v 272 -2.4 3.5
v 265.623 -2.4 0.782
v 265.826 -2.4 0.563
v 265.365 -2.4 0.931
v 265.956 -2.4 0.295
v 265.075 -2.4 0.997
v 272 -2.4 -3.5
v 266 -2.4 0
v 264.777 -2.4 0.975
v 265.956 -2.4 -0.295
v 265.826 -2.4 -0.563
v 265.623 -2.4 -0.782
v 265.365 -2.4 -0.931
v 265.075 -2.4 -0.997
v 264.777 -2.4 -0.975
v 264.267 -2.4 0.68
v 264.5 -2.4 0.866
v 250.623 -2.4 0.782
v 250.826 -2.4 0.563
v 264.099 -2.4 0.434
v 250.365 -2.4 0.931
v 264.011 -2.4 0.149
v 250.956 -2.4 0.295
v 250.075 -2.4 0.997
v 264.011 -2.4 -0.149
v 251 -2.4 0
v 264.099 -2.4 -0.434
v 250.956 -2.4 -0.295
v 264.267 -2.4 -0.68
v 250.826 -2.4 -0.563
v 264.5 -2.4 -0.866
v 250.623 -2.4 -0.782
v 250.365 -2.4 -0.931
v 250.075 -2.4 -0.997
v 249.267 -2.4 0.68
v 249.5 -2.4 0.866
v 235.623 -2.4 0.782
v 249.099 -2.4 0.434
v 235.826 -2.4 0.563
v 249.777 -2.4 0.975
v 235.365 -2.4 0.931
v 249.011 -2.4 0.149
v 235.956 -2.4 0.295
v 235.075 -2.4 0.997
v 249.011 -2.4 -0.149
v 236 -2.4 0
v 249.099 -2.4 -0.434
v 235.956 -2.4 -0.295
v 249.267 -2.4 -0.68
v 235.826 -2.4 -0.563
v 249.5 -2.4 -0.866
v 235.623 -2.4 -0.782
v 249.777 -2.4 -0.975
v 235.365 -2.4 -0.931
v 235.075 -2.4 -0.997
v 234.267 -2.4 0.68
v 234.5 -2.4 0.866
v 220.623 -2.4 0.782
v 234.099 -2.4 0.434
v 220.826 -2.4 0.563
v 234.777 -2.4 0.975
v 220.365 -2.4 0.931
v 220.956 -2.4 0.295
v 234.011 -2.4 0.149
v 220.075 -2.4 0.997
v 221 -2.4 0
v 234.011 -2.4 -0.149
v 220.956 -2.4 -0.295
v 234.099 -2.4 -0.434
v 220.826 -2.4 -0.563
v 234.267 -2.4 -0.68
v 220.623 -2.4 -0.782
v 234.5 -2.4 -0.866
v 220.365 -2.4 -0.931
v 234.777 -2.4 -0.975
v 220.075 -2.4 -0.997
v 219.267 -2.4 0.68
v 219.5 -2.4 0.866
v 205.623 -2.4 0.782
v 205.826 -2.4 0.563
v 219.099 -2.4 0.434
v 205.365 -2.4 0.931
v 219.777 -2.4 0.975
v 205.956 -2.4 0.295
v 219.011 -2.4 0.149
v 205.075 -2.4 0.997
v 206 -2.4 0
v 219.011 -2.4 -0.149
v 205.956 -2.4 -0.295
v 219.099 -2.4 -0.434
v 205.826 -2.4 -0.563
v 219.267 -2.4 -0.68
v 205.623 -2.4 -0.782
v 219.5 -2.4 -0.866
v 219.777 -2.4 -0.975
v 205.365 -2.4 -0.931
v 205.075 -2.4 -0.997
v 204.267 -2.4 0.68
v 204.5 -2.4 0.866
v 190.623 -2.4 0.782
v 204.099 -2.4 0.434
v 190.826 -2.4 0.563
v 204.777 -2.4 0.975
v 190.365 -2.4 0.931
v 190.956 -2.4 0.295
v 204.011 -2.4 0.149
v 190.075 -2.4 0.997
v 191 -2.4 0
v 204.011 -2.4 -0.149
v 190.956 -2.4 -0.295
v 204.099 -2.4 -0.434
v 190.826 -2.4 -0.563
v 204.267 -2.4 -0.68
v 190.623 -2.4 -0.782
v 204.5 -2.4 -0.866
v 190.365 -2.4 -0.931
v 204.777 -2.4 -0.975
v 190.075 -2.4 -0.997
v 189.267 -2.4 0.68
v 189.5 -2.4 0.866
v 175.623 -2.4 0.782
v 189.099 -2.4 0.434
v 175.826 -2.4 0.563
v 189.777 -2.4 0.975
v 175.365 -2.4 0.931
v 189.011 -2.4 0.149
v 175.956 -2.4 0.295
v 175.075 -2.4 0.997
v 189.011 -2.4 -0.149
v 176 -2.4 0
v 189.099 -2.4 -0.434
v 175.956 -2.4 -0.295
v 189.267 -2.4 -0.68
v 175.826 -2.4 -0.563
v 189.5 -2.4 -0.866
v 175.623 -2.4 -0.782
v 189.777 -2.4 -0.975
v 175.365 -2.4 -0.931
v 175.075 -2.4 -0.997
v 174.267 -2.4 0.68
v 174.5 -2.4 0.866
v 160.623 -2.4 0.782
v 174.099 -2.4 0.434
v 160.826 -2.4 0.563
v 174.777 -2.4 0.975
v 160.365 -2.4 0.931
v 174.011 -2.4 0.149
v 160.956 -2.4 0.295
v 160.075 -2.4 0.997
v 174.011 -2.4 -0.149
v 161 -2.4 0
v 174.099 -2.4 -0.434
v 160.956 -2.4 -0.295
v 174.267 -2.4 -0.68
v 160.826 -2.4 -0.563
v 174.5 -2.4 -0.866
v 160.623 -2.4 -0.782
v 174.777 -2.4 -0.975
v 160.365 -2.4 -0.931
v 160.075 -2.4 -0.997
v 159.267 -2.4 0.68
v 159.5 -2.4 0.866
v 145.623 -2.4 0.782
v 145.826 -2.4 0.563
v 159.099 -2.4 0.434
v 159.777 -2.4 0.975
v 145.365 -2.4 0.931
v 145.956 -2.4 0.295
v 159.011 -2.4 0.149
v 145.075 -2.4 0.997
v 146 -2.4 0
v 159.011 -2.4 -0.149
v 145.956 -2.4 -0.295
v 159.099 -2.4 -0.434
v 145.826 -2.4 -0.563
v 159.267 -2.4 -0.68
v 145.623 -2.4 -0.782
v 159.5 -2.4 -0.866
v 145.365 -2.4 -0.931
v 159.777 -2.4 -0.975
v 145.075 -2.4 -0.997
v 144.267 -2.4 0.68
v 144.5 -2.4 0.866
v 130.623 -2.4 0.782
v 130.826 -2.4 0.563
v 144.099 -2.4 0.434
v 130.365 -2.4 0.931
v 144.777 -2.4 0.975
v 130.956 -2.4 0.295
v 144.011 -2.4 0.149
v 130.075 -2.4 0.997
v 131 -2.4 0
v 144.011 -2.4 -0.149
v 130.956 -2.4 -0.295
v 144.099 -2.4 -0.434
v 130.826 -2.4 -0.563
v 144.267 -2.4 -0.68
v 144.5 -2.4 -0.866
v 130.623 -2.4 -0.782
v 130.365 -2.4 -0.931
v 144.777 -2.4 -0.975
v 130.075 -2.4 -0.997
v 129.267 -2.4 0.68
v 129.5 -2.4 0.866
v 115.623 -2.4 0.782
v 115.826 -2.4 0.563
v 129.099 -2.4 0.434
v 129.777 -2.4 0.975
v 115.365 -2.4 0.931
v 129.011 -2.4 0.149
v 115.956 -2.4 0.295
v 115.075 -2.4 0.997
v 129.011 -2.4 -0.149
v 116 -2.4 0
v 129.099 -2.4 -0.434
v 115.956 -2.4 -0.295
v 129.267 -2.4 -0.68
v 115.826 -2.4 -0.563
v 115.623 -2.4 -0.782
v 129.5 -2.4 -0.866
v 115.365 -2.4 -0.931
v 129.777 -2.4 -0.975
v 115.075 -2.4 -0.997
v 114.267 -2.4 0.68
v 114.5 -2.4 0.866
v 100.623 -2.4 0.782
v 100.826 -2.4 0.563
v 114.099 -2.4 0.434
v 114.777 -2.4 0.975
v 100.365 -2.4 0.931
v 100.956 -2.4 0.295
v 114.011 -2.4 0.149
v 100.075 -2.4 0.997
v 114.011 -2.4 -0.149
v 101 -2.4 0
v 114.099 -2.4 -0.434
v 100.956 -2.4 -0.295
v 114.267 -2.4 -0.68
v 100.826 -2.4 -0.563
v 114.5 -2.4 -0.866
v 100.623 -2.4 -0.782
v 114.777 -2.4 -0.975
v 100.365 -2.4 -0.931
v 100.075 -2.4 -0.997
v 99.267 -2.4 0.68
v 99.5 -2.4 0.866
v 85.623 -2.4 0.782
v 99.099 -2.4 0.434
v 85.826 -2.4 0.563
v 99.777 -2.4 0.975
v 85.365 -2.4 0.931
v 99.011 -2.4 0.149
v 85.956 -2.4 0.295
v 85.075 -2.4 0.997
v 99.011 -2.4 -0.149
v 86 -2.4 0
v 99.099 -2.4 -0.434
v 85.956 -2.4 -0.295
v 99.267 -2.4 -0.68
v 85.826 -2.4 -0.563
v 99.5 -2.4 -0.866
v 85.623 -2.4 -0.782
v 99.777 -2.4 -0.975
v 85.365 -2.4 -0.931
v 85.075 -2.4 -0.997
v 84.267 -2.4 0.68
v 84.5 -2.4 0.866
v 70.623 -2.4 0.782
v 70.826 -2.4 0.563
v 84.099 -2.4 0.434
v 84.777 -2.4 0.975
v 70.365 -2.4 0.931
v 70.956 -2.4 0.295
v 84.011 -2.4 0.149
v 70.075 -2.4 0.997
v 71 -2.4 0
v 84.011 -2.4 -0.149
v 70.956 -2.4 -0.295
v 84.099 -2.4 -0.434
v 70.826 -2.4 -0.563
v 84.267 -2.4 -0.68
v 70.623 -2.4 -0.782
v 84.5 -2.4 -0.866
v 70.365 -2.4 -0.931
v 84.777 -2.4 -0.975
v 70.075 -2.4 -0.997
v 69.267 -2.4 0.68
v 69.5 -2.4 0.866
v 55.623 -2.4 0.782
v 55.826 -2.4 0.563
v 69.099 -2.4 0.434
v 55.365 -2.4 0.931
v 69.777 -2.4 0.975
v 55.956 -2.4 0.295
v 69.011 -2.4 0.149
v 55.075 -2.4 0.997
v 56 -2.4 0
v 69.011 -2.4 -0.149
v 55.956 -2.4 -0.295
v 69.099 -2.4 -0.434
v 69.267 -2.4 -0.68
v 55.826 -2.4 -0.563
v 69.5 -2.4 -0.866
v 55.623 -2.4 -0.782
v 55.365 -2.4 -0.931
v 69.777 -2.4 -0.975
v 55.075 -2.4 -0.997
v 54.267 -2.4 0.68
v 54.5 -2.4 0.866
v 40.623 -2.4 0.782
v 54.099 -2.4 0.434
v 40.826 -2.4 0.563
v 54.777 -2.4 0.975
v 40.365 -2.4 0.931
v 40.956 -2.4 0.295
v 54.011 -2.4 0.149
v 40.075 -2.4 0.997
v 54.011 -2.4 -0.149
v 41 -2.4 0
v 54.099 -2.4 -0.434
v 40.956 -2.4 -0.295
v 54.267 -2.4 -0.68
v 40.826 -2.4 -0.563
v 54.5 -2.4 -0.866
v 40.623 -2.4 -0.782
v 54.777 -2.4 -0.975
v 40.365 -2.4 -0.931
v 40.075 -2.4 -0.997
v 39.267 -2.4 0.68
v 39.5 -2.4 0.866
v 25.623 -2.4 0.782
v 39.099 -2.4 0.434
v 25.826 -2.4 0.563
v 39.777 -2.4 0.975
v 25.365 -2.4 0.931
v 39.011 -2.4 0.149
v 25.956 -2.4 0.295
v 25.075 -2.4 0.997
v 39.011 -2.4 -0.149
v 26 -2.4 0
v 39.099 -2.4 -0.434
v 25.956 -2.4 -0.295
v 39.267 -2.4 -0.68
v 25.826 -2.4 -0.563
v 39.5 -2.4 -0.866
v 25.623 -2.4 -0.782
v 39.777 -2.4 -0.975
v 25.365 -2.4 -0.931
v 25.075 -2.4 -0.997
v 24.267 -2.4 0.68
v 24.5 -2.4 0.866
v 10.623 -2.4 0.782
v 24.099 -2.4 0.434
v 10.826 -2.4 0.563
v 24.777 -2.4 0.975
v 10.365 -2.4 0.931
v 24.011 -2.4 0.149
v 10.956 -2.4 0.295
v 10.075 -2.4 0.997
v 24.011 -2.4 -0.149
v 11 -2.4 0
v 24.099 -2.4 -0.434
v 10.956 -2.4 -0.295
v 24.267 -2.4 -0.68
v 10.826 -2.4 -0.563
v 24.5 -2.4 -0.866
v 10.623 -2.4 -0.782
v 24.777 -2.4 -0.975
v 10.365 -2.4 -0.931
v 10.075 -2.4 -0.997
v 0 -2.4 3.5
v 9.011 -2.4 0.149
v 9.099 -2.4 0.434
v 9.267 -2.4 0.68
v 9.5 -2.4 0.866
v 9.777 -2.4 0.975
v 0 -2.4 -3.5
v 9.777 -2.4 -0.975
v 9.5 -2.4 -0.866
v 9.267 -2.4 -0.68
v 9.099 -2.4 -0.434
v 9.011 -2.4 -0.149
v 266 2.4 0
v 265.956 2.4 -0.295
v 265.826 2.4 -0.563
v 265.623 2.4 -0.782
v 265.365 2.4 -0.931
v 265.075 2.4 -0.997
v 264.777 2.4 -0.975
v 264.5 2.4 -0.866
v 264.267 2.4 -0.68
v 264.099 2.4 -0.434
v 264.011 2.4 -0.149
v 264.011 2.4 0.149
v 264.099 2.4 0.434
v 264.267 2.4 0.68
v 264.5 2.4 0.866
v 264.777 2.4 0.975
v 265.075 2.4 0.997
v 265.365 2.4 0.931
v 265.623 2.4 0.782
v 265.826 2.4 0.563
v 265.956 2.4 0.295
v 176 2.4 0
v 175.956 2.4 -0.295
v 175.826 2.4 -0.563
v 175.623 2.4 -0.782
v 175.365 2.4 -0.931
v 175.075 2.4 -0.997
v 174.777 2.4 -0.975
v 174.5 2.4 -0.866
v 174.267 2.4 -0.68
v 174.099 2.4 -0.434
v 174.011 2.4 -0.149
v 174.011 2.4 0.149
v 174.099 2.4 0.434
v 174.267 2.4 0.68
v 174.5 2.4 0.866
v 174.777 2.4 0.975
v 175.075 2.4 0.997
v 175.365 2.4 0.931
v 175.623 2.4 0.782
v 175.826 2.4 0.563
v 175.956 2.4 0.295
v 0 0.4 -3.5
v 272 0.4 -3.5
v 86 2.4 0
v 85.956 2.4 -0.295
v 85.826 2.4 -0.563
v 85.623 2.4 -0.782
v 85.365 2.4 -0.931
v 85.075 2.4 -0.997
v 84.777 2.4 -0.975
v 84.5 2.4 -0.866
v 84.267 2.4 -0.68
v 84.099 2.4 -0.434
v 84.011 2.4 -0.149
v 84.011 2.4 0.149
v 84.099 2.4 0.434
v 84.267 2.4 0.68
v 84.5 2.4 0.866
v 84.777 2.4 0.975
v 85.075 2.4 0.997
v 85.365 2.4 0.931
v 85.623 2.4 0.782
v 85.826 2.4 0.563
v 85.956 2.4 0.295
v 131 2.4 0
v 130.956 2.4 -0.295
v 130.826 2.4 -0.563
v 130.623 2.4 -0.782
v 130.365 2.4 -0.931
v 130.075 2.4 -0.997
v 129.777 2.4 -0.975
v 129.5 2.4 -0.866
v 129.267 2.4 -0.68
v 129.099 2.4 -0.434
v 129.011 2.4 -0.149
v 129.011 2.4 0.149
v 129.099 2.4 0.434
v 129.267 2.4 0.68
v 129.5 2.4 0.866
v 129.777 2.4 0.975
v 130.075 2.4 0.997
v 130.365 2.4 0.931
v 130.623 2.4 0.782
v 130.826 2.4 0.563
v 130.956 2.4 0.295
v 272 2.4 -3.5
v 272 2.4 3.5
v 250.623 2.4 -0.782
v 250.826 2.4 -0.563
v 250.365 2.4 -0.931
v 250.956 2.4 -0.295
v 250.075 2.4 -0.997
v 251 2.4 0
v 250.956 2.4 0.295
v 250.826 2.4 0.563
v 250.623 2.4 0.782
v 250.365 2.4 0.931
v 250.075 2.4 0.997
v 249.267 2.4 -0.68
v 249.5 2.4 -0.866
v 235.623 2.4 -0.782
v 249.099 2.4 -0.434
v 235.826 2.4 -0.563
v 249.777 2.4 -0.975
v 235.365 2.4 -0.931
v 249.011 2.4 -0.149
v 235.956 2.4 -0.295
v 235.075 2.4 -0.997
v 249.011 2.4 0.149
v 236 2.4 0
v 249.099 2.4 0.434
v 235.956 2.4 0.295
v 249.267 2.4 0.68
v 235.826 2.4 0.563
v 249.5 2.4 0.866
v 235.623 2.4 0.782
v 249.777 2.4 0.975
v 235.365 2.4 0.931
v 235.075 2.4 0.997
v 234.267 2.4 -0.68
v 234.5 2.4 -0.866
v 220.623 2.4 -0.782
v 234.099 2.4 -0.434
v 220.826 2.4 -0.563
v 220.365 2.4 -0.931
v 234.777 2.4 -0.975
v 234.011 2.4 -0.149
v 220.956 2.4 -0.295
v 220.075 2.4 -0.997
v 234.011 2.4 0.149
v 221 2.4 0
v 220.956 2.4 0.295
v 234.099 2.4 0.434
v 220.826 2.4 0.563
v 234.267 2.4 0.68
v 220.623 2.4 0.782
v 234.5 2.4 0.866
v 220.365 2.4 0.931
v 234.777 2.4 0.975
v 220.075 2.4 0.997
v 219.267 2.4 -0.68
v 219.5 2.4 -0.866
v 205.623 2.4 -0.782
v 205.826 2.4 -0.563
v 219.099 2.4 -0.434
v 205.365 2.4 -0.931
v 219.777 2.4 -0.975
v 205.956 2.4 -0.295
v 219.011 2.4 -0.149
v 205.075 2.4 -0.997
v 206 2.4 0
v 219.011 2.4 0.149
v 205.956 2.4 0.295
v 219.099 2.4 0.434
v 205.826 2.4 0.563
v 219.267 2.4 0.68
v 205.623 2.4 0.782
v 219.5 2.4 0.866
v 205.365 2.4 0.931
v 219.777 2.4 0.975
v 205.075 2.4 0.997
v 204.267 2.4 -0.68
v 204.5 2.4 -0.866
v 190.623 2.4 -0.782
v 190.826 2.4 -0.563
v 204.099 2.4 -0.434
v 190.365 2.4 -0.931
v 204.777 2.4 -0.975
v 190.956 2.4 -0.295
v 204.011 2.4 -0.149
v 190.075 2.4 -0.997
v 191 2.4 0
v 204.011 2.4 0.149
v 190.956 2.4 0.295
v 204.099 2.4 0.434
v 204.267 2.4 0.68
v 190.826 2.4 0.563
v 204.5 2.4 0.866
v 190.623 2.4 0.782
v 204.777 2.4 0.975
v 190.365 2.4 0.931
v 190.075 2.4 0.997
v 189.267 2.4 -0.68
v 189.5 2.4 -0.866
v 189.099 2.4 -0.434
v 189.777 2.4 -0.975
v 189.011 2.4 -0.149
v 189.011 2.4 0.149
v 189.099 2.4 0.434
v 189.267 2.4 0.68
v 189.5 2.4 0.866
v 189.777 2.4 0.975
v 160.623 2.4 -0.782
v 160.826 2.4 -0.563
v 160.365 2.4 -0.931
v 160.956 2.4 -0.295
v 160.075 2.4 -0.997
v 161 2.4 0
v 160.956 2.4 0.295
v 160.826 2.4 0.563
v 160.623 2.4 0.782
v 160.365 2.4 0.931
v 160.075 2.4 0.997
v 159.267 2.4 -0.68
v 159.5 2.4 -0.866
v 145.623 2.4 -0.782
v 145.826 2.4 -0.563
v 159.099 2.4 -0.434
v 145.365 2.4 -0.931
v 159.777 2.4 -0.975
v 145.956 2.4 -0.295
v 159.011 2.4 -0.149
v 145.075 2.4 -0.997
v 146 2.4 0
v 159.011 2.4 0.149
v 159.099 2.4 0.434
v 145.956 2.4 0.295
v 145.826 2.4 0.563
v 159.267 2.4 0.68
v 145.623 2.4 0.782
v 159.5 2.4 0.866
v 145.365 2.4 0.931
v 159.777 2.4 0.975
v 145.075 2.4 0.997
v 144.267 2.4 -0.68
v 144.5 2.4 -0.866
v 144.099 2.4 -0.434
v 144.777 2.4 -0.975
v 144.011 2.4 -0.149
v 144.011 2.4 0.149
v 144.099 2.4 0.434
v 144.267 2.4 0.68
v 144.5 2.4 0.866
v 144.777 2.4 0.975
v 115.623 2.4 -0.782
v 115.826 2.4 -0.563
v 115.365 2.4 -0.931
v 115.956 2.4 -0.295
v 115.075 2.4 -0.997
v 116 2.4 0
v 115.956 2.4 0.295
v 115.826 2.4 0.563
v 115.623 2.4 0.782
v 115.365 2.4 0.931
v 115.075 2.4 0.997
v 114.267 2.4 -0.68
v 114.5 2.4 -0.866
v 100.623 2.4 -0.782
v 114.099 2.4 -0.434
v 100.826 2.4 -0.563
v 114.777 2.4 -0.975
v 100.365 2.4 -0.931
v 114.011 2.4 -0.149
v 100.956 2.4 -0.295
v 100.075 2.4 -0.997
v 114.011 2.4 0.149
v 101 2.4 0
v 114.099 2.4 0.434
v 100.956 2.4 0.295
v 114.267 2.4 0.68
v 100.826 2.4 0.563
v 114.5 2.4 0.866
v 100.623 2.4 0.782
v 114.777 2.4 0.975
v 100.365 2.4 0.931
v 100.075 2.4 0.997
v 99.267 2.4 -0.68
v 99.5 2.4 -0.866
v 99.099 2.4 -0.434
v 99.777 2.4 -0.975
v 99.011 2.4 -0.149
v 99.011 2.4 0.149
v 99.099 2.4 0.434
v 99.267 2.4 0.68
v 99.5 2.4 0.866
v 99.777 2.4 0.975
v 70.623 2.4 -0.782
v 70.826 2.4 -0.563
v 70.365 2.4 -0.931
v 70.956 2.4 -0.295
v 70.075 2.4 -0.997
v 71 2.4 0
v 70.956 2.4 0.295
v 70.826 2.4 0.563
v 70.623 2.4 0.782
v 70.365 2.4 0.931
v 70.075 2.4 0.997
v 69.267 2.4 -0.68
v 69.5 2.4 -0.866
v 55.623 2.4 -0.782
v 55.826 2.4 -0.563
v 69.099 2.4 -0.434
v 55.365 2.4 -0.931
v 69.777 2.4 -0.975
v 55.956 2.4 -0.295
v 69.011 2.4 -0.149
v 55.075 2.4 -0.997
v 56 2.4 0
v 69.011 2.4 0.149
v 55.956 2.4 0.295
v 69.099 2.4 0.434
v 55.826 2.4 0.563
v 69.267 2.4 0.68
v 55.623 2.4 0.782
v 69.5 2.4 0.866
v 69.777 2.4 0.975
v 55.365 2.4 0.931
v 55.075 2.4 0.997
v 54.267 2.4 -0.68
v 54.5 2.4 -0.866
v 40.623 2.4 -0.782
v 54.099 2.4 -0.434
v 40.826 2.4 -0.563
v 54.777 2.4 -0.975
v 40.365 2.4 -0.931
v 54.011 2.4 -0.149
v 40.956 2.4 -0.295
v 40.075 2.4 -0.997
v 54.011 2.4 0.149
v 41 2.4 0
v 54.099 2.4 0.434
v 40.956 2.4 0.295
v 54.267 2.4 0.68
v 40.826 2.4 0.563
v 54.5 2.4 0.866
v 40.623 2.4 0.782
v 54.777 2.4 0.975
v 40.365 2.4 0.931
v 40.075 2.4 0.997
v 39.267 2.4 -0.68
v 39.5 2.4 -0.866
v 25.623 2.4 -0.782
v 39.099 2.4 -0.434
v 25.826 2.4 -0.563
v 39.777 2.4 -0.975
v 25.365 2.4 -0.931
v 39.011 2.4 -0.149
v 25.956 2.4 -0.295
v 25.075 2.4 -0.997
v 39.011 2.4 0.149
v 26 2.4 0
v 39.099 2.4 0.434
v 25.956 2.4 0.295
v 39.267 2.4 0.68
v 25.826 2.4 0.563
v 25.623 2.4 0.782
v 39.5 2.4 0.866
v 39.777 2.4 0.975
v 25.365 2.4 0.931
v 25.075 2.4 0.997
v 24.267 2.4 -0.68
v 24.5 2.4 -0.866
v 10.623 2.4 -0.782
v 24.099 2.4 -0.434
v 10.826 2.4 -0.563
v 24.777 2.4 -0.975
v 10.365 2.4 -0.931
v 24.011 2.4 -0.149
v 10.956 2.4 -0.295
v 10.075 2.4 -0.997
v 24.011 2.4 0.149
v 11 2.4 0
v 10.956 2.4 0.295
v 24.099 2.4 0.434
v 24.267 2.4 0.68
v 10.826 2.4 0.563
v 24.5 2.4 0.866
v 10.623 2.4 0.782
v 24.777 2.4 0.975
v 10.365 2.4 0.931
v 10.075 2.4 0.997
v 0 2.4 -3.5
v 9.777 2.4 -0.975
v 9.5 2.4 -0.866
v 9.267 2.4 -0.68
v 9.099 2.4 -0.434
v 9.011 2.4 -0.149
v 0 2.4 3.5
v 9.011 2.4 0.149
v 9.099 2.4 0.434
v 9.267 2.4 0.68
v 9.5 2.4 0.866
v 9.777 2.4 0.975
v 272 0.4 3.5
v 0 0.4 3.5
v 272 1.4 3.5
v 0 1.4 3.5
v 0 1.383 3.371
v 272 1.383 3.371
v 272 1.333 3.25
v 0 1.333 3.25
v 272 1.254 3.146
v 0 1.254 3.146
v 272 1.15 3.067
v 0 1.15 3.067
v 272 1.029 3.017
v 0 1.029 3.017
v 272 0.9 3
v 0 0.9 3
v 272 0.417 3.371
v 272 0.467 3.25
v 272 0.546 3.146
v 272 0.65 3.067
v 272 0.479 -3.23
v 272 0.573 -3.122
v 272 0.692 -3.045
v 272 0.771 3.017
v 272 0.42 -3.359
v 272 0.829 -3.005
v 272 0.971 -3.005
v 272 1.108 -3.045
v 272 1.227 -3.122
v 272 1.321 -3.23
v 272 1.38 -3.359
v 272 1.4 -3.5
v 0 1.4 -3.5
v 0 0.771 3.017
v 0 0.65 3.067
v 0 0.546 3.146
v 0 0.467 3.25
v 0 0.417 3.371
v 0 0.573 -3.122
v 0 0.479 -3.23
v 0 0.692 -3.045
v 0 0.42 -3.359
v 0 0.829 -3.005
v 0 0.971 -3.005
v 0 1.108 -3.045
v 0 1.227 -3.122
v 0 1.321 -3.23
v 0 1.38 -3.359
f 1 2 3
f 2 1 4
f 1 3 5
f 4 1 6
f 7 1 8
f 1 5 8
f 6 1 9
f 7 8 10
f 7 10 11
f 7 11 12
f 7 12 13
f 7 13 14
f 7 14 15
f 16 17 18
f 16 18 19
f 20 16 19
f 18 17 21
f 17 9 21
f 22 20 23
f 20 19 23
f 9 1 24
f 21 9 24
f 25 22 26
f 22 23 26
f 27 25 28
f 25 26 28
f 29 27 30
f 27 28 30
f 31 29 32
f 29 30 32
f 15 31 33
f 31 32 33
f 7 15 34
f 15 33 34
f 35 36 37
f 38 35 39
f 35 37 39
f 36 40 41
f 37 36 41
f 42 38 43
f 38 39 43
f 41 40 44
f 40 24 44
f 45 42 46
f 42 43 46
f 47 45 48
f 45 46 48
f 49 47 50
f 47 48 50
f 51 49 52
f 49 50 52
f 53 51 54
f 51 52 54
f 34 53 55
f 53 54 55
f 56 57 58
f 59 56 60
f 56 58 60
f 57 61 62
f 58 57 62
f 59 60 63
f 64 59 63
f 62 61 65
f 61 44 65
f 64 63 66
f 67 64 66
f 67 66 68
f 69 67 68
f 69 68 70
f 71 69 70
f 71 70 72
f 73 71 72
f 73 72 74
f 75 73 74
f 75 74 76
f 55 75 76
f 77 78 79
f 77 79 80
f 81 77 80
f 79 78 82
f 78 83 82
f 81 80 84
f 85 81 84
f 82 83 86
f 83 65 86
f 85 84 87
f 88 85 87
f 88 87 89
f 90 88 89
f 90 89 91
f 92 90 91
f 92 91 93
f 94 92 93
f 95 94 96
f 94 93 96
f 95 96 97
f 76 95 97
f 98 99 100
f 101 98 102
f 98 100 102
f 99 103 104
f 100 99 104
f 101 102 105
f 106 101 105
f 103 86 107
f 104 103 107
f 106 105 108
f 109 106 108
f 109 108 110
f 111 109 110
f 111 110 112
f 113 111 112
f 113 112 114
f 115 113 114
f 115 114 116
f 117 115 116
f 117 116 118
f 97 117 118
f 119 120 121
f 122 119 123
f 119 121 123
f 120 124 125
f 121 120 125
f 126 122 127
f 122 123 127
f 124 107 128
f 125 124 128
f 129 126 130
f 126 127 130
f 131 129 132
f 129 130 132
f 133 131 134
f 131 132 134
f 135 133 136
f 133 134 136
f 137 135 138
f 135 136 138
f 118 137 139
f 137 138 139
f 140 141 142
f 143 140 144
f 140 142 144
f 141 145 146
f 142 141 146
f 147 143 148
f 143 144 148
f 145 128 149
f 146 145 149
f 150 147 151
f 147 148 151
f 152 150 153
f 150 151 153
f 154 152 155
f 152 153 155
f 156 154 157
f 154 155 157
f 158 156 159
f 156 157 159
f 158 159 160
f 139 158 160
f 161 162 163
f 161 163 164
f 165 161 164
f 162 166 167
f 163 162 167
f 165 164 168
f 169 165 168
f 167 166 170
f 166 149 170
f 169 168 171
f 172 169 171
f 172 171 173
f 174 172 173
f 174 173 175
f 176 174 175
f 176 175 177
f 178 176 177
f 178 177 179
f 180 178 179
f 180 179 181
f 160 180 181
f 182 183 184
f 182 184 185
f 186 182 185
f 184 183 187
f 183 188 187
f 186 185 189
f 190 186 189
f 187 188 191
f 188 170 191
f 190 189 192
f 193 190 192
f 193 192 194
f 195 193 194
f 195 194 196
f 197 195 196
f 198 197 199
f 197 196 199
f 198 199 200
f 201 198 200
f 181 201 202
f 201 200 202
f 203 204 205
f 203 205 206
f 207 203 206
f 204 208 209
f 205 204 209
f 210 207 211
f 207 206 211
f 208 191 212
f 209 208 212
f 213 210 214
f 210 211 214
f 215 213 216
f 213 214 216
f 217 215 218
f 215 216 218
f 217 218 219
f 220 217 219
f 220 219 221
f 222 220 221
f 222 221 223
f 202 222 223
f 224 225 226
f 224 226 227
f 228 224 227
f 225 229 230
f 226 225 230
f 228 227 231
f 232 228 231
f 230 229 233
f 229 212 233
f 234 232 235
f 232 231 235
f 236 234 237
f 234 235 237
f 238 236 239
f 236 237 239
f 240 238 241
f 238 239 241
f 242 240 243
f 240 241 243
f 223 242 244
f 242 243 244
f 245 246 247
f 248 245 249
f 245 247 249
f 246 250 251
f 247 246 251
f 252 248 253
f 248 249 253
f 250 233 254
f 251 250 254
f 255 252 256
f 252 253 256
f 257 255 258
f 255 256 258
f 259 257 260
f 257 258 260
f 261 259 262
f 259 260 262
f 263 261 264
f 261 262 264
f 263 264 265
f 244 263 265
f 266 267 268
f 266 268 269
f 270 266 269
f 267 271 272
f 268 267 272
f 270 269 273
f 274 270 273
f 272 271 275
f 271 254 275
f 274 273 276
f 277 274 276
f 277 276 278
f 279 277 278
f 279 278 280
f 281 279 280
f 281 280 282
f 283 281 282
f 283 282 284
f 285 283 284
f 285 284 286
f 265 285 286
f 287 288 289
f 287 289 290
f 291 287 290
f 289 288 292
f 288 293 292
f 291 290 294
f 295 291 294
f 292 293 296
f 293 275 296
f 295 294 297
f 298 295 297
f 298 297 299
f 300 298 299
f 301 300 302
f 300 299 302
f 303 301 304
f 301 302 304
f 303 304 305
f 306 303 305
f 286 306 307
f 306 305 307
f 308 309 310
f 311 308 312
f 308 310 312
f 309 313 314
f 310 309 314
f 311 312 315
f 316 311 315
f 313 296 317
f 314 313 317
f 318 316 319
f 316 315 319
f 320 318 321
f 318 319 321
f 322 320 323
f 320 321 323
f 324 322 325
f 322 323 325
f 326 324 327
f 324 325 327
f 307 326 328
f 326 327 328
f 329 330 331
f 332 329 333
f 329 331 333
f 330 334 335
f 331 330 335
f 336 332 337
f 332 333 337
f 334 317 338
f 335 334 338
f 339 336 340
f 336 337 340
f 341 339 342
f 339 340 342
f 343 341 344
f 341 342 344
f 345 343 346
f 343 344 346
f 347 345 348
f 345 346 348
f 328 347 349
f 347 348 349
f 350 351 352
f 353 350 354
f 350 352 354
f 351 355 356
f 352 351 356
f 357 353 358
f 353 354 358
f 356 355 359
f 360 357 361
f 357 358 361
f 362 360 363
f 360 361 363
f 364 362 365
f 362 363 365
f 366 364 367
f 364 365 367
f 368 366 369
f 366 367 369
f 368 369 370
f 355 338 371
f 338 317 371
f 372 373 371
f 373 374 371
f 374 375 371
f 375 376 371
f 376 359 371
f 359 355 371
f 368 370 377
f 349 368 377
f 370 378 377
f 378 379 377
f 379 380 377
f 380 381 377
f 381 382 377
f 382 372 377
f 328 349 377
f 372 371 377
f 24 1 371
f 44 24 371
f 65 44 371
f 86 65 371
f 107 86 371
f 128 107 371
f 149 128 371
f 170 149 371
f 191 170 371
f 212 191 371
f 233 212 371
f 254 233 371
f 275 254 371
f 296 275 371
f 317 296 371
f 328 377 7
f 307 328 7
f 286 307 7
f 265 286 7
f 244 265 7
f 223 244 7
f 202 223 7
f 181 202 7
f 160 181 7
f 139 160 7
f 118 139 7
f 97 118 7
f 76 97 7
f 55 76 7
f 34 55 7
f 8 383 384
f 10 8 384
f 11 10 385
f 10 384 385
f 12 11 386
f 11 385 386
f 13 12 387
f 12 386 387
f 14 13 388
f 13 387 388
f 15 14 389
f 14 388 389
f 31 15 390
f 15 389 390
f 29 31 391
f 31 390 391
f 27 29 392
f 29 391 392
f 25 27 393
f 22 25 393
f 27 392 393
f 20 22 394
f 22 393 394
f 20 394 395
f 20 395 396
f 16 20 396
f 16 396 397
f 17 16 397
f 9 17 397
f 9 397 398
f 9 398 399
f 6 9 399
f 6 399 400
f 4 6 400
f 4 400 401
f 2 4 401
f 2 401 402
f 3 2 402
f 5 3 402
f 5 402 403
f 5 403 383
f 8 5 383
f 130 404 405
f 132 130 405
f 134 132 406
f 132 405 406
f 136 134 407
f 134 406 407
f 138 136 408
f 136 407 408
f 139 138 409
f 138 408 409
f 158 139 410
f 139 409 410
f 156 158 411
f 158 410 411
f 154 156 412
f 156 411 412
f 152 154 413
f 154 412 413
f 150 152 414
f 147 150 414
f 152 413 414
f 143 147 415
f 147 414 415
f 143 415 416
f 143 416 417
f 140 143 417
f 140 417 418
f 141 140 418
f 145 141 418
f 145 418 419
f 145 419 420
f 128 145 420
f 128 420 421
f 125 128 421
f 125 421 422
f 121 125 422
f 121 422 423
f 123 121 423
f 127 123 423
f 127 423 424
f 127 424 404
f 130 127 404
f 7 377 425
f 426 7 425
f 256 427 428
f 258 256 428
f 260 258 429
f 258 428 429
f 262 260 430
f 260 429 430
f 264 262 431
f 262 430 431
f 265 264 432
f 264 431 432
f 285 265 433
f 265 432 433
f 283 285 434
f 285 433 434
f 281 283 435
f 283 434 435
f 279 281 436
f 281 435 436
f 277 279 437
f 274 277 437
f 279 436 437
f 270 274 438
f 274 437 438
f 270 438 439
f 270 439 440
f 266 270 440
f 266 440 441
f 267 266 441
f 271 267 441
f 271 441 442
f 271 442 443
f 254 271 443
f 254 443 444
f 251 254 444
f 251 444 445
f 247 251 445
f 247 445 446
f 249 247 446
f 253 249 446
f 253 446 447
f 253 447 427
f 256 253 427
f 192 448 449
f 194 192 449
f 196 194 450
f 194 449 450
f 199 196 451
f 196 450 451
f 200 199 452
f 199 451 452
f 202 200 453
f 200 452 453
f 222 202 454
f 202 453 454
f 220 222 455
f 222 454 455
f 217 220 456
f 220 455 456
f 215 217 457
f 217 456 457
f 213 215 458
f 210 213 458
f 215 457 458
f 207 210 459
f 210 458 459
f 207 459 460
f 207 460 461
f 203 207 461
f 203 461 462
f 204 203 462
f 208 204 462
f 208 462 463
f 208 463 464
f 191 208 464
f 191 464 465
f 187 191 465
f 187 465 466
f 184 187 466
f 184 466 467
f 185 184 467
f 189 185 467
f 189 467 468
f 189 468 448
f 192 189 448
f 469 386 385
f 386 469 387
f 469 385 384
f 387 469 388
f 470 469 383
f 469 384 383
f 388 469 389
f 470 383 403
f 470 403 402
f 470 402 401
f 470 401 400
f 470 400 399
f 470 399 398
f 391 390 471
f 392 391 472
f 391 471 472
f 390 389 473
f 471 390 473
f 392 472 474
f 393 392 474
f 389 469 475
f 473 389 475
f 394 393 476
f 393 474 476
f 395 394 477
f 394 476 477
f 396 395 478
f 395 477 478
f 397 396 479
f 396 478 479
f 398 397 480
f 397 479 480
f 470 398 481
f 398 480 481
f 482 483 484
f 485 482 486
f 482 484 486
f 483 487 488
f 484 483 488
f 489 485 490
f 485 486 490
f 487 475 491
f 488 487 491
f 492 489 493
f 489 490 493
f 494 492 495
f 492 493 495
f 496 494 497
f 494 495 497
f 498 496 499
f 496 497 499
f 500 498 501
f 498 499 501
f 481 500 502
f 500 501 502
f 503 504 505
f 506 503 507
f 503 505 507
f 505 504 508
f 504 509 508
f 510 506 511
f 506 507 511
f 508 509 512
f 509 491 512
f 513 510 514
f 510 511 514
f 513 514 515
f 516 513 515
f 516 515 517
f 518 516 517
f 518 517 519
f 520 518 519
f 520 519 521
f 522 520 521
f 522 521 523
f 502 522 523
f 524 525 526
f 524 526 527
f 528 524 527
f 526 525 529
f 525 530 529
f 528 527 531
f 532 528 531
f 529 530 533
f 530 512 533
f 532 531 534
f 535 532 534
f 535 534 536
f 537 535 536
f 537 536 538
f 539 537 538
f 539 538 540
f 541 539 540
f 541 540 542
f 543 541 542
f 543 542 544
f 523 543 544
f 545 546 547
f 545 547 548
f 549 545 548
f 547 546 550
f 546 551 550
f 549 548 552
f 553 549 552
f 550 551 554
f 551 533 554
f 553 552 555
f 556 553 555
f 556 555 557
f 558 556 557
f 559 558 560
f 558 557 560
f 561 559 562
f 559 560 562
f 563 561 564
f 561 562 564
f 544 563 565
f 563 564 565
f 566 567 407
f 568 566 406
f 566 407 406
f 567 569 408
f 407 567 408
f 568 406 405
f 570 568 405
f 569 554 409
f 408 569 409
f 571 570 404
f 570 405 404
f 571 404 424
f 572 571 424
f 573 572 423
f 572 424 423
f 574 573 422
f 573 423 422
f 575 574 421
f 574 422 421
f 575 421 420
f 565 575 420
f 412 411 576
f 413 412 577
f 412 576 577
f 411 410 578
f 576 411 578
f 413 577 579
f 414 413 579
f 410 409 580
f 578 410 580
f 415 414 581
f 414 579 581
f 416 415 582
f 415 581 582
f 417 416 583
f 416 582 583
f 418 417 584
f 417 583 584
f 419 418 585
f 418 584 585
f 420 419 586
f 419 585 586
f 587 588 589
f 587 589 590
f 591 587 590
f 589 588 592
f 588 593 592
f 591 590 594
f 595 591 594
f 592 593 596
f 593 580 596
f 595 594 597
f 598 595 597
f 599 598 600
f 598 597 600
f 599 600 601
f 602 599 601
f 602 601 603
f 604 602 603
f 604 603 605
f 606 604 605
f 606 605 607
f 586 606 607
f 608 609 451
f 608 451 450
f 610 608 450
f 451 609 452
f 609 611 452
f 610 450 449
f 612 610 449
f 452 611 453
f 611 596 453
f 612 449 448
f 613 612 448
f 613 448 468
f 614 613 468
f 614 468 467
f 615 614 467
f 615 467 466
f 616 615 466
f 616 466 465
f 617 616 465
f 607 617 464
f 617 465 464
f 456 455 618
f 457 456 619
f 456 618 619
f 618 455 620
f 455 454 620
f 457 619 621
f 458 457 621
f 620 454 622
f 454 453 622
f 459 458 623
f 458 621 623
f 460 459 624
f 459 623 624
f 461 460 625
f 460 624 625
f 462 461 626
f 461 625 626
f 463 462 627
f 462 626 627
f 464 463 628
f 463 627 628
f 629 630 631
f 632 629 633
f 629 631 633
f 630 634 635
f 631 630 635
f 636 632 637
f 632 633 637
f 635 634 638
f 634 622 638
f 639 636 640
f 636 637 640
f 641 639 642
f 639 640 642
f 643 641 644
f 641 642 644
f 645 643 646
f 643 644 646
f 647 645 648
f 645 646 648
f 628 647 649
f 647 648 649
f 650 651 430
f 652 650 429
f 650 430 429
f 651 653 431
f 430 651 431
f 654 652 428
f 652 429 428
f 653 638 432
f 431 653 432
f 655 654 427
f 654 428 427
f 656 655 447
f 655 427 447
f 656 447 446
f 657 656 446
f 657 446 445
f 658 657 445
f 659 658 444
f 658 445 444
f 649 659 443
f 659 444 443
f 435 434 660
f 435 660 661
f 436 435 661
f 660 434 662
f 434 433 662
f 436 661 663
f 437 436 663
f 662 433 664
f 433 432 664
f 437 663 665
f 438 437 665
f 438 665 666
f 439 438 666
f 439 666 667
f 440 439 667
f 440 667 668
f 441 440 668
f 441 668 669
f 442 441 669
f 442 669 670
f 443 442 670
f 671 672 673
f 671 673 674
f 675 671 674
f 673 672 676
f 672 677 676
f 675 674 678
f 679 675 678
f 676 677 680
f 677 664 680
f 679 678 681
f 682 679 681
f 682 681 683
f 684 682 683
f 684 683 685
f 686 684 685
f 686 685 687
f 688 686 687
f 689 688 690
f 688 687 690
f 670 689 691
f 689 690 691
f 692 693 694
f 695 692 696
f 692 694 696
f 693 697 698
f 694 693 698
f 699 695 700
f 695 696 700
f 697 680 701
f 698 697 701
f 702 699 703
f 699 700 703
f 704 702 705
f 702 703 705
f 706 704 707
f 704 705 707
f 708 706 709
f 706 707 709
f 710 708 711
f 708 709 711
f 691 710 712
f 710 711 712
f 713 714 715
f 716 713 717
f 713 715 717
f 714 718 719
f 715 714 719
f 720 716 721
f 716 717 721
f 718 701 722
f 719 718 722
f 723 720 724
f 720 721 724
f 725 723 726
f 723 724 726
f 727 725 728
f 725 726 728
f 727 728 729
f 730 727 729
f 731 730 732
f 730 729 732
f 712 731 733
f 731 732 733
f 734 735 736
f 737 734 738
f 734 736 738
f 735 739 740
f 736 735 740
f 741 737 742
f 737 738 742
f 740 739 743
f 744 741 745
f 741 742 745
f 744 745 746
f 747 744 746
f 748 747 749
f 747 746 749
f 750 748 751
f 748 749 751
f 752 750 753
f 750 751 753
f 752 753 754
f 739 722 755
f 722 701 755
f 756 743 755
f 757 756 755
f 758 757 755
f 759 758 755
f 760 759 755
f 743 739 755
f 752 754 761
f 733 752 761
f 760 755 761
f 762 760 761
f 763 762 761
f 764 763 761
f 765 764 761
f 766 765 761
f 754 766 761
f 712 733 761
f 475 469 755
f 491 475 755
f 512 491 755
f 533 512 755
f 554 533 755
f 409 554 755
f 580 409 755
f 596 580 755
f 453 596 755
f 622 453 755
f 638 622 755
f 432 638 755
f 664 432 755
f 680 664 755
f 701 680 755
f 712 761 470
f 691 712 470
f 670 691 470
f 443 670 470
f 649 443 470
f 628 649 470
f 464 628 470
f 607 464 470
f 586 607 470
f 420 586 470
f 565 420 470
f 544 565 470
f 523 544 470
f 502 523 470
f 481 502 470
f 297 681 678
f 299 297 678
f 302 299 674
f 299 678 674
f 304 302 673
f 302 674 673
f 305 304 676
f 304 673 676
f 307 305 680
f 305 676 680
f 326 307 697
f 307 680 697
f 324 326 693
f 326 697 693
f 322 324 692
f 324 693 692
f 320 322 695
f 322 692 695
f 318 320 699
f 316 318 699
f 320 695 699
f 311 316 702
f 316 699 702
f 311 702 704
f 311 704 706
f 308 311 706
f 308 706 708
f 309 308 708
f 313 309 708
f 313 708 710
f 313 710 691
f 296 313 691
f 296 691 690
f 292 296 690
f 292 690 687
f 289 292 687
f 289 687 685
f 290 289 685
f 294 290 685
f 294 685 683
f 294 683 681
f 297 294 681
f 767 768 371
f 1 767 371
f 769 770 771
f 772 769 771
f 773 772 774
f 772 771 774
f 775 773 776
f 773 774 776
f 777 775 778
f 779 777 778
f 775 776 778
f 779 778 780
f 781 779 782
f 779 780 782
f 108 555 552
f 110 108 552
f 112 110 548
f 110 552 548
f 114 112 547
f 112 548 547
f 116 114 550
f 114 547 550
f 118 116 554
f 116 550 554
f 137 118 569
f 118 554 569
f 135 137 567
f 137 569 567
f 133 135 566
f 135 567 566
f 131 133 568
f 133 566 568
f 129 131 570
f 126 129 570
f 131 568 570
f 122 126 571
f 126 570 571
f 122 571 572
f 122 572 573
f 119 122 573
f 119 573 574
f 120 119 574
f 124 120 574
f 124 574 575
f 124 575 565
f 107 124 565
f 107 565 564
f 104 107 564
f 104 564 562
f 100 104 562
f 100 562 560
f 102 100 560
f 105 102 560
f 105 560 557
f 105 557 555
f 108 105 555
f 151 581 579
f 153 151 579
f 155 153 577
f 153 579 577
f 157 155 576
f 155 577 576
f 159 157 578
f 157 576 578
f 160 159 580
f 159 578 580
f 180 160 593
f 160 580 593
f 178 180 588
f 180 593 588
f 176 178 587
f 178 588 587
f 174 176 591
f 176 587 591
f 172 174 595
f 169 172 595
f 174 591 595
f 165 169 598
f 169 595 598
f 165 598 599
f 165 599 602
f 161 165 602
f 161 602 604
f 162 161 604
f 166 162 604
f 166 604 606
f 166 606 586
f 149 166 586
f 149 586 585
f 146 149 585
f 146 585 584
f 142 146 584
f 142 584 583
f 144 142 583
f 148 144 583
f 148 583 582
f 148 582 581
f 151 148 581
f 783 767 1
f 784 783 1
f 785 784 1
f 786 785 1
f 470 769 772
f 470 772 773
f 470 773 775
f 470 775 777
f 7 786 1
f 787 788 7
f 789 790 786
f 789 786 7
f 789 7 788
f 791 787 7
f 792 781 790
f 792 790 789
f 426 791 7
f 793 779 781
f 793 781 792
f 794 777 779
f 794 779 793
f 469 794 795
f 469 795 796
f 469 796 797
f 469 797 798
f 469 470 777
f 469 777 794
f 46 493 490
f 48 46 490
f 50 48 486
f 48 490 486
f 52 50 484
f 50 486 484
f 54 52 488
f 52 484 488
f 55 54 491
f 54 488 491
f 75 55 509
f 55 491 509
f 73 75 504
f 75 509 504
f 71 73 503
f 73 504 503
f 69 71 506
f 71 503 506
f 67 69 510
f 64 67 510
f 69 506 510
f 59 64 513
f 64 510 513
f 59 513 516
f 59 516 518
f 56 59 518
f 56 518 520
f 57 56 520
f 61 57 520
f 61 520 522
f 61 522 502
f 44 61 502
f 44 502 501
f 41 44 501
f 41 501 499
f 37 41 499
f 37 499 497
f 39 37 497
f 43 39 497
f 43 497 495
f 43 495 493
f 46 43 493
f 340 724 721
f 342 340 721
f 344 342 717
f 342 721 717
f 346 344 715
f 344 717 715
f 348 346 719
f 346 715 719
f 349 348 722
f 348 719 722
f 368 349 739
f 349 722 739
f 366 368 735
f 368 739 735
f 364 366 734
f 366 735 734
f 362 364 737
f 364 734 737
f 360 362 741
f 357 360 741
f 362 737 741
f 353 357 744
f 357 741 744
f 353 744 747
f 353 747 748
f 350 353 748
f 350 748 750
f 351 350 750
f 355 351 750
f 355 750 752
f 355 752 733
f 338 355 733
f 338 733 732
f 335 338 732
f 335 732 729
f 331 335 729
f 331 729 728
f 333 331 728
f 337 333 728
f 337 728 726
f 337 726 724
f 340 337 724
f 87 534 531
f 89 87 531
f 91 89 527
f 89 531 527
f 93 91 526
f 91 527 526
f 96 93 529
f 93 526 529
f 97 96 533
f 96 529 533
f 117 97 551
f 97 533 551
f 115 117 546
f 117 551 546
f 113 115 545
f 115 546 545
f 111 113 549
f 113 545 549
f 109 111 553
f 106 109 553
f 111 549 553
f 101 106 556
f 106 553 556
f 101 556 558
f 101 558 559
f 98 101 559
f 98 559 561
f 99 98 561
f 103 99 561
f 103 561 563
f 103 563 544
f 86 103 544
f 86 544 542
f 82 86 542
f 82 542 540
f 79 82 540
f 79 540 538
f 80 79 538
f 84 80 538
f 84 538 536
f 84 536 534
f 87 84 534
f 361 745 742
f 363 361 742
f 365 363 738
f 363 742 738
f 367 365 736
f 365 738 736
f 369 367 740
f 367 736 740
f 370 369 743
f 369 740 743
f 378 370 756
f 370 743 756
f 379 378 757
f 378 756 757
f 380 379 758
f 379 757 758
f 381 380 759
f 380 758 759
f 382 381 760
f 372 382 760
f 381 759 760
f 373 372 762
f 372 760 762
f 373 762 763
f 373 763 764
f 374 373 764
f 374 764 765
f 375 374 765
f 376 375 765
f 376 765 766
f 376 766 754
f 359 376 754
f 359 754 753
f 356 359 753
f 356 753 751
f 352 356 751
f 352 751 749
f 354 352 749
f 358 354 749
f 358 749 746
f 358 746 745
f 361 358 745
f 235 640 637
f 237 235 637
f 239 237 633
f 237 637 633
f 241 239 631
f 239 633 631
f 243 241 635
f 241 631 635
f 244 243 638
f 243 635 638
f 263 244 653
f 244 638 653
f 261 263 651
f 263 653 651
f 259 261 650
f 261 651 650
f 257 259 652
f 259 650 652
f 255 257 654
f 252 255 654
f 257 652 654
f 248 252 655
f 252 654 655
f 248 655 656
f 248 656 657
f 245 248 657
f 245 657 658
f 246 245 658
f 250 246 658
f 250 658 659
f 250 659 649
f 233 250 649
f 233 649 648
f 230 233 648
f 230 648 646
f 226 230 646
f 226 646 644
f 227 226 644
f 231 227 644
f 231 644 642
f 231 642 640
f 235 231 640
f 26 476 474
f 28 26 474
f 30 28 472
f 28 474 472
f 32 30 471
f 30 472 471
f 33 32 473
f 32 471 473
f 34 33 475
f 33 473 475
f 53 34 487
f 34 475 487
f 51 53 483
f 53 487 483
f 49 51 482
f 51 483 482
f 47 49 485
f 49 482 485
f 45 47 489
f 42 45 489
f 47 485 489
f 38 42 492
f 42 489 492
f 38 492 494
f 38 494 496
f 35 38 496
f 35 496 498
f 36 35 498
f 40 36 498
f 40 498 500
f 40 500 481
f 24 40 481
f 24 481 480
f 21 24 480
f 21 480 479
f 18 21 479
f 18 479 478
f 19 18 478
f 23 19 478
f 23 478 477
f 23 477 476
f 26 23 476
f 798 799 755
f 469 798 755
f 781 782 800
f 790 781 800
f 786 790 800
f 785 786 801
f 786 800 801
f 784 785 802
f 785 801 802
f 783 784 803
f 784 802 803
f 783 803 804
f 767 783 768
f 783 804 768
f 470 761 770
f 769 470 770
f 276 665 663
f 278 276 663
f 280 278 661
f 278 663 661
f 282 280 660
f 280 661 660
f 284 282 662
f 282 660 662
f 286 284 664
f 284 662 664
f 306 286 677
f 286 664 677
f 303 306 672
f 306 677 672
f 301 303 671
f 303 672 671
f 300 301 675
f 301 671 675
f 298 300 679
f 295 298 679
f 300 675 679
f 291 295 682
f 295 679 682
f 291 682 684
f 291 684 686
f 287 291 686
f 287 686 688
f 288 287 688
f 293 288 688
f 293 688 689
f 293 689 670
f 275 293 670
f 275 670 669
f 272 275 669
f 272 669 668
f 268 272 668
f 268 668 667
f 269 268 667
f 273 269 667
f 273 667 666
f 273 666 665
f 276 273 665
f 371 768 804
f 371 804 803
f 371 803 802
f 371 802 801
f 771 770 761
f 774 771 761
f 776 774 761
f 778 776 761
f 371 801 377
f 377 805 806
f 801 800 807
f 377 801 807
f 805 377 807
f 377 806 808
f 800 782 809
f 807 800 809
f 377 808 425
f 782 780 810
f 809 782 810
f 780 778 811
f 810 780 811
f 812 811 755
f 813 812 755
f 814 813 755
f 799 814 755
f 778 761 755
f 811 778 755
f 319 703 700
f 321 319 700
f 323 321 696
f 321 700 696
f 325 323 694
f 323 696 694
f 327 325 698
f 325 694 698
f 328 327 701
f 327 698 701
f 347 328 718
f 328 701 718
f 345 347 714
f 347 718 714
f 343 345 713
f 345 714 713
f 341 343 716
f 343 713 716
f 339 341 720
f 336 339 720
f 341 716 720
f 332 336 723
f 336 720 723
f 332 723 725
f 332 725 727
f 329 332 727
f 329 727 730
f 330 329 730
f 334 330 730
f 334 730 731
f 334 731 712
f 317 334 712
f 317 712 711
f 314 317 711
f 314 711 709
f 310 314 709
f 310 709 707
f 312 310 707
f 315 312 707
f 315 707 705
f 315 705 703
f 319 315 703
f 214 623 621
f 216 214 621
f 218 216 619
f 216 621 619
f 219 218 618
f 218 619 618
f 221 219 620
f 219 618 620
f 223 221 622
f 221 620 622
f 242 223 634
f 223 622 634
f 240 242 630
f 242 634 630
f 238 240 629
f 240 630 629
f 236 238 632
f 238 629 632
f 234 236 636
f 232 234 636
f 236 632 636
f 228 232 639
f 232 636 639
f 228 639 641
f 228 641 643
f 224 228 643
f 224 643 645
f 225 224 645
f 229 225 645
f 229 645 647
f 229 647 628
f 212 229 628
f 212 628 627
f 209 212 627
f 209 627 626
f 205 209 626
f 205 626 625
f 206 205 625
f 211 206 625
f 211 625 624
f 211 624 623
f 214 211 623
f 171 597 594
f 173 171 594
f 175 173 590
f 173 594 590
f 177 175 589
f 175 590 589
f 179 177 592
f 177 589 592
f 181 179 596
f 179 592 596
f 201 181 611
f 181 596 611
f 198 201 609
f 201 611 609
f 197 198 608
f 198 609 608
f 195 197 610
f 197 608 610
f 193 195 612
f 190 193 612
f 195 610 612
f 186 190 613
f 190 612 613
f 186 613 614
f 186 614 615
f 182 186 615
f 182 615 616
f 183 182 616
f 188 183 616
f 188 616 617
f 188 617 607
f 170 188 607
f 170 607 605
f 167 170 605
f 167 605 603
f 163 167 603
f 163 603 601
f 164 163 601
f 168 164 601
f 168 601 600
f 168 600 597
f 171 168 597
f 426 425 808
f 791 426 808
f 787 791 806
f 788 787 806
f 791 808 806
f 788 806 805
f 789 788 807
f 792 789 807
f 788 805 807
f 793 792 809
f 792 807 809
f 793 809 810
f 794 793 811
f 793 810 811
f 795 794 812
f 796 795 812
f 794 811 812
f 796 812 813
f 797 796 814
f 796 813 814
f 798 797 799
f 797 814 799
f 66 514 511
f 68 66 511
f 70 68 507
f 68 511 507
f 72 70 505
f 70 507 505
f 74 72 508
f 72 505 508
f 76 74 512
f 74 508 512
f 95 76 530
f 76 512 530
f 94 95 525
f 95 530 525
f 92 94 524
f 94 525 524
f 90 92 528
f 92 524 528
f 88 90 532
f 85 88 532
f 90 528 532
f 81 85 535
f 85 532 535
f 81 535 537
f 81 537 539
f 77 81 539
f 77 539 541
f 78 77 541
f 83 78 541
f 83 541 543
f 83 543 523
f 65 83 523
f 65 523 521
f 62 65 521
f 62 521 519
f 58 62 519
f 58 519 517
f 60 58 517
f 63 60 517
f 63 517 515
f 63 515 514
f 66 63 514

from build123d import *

# Parameters (mm, degrees)
BOSS_EXTRUDE1_DEPTH = 272
SKETCH2_R           = 1
CUT_EXTRUDE1_DEPTH  = 5.8


with BuildPart() as part:
    # Sketch1 → Boss-Extrude1 (new body)
    with BuildSketch(Plane(origin=(0, 0, 0), x_dir=(0, 0, -1), z_dir=(1, 0, 0))):
        with BuildLine():
            Line((3.5, 2.4), (-3.5, 2.4))
            Line((-3.5, 2.4), (-3.5, 1.4))
            ThreePointArc((-3.5, 1.4), (-3.146446609, 1.253553391), (-3, 0.9))
            ThreePointArc((-3, 0.9), (-3.146446609, 0.546446609), (-3.5, 0.4))
            Line((-3.5, 0.4), (-3.5, -2.4))
            Line((-3.5, -2.4), (3.5, -2.4))
            Line((3.5, -2.4), (3.5, 0.4))
            ThreePointArc((3.5, 0.4), (3, 0.9), (3.5, 1.4))
            Line((3.5, 1.4), (3.5, 2.4))
        make_face()
    extrude(amount=BOSS_EXTRUDE1_DEPTH)

    # Sketch2 → Cut-Extrude1 (cut, through all)
    with BuildSketch(Plane(origin=(0, 2.4, 0), x_dir=(1, 0, 0), z_dir=(0, 1, 0))):
        with Locations((10, 0)):
            Circle(SKETCH2_R)
        with Locations((25, 0)):
            Circle(SKETCH2_R)
        with Locations((40, 0)):
            Circle(SKETCH2_R)
        with Locations((55, 0)):
            Circle(SKETCH2_R)
        with Locations((70, 0)):
            Circle(SKETCH2_R)
        with Locations((85, 0)):
            Circle(SKETCH2_R)
        with Locations((100, 0)):
            Circle(SKETCH2_R)
        with Locations((115, 0)):
            Circle(SKETCH2_R)
        with Locations((130, 0)):
            Circle(SKETCH2_R)
        with Locations((145, 0)):
            Circle(SKETCH2_R)
        with Locations((160, 0)):
            Circle(SKETCH2_R)
        with Locations((175, 0)):
            Circle(SKETCH2_R)
        with Locations((190, 0)):
            Circle(SKETCH2_R)
        with Locations((205, 0)):
            Circle(SKETCH2_R)
        with Locations((220, 0)):
            Circle(SKETCH2_R)
        with Locations((235, 0)):
            Circle(SKETCH2_R)
        with Locations((250, 0)):
            Circle(SKETCH2_R)
        with Locations((265, 0)):
            Circle(SKETCH2_R)
        with Locations((280, 0)):
            Circle(SKETCH2_R)
        with Locations((295, 0)):
            Circle(SKETCH2_R)
        with Locations((310, 0)):
            Circle(SKETCH2_R)
        with Locations((325, 0)):
            Circle(SKETCH2_R)
        with Locations((340, 0)):
            Circle(SKETCH2_R)
        with Locations((355, 0)):
            Circle(SKETCH2_R)
        with Locations((370, 0)):
            Circle(SKETCH2_R)
        with Locations((385, 0)):
            Circle(SKETCH2_R)
        with Locations((400, 0)):
            Circle(SKETCH2_R)
        with Locations((415, 0)):
            Circle(SKETCH2_R)
        with Locations((430, 0)):
            Circle(SKETCH2_R)
        with Locations((445, 0)):
            Circle(SKETCH2_R)
        with Locations((460, 0)):
            Circle(SKETCH2_R)
    extrude(amount=-CUT_EXTRUDE1_DEPTH, mode=Mode.SUBTRACT)


solid = part.part
